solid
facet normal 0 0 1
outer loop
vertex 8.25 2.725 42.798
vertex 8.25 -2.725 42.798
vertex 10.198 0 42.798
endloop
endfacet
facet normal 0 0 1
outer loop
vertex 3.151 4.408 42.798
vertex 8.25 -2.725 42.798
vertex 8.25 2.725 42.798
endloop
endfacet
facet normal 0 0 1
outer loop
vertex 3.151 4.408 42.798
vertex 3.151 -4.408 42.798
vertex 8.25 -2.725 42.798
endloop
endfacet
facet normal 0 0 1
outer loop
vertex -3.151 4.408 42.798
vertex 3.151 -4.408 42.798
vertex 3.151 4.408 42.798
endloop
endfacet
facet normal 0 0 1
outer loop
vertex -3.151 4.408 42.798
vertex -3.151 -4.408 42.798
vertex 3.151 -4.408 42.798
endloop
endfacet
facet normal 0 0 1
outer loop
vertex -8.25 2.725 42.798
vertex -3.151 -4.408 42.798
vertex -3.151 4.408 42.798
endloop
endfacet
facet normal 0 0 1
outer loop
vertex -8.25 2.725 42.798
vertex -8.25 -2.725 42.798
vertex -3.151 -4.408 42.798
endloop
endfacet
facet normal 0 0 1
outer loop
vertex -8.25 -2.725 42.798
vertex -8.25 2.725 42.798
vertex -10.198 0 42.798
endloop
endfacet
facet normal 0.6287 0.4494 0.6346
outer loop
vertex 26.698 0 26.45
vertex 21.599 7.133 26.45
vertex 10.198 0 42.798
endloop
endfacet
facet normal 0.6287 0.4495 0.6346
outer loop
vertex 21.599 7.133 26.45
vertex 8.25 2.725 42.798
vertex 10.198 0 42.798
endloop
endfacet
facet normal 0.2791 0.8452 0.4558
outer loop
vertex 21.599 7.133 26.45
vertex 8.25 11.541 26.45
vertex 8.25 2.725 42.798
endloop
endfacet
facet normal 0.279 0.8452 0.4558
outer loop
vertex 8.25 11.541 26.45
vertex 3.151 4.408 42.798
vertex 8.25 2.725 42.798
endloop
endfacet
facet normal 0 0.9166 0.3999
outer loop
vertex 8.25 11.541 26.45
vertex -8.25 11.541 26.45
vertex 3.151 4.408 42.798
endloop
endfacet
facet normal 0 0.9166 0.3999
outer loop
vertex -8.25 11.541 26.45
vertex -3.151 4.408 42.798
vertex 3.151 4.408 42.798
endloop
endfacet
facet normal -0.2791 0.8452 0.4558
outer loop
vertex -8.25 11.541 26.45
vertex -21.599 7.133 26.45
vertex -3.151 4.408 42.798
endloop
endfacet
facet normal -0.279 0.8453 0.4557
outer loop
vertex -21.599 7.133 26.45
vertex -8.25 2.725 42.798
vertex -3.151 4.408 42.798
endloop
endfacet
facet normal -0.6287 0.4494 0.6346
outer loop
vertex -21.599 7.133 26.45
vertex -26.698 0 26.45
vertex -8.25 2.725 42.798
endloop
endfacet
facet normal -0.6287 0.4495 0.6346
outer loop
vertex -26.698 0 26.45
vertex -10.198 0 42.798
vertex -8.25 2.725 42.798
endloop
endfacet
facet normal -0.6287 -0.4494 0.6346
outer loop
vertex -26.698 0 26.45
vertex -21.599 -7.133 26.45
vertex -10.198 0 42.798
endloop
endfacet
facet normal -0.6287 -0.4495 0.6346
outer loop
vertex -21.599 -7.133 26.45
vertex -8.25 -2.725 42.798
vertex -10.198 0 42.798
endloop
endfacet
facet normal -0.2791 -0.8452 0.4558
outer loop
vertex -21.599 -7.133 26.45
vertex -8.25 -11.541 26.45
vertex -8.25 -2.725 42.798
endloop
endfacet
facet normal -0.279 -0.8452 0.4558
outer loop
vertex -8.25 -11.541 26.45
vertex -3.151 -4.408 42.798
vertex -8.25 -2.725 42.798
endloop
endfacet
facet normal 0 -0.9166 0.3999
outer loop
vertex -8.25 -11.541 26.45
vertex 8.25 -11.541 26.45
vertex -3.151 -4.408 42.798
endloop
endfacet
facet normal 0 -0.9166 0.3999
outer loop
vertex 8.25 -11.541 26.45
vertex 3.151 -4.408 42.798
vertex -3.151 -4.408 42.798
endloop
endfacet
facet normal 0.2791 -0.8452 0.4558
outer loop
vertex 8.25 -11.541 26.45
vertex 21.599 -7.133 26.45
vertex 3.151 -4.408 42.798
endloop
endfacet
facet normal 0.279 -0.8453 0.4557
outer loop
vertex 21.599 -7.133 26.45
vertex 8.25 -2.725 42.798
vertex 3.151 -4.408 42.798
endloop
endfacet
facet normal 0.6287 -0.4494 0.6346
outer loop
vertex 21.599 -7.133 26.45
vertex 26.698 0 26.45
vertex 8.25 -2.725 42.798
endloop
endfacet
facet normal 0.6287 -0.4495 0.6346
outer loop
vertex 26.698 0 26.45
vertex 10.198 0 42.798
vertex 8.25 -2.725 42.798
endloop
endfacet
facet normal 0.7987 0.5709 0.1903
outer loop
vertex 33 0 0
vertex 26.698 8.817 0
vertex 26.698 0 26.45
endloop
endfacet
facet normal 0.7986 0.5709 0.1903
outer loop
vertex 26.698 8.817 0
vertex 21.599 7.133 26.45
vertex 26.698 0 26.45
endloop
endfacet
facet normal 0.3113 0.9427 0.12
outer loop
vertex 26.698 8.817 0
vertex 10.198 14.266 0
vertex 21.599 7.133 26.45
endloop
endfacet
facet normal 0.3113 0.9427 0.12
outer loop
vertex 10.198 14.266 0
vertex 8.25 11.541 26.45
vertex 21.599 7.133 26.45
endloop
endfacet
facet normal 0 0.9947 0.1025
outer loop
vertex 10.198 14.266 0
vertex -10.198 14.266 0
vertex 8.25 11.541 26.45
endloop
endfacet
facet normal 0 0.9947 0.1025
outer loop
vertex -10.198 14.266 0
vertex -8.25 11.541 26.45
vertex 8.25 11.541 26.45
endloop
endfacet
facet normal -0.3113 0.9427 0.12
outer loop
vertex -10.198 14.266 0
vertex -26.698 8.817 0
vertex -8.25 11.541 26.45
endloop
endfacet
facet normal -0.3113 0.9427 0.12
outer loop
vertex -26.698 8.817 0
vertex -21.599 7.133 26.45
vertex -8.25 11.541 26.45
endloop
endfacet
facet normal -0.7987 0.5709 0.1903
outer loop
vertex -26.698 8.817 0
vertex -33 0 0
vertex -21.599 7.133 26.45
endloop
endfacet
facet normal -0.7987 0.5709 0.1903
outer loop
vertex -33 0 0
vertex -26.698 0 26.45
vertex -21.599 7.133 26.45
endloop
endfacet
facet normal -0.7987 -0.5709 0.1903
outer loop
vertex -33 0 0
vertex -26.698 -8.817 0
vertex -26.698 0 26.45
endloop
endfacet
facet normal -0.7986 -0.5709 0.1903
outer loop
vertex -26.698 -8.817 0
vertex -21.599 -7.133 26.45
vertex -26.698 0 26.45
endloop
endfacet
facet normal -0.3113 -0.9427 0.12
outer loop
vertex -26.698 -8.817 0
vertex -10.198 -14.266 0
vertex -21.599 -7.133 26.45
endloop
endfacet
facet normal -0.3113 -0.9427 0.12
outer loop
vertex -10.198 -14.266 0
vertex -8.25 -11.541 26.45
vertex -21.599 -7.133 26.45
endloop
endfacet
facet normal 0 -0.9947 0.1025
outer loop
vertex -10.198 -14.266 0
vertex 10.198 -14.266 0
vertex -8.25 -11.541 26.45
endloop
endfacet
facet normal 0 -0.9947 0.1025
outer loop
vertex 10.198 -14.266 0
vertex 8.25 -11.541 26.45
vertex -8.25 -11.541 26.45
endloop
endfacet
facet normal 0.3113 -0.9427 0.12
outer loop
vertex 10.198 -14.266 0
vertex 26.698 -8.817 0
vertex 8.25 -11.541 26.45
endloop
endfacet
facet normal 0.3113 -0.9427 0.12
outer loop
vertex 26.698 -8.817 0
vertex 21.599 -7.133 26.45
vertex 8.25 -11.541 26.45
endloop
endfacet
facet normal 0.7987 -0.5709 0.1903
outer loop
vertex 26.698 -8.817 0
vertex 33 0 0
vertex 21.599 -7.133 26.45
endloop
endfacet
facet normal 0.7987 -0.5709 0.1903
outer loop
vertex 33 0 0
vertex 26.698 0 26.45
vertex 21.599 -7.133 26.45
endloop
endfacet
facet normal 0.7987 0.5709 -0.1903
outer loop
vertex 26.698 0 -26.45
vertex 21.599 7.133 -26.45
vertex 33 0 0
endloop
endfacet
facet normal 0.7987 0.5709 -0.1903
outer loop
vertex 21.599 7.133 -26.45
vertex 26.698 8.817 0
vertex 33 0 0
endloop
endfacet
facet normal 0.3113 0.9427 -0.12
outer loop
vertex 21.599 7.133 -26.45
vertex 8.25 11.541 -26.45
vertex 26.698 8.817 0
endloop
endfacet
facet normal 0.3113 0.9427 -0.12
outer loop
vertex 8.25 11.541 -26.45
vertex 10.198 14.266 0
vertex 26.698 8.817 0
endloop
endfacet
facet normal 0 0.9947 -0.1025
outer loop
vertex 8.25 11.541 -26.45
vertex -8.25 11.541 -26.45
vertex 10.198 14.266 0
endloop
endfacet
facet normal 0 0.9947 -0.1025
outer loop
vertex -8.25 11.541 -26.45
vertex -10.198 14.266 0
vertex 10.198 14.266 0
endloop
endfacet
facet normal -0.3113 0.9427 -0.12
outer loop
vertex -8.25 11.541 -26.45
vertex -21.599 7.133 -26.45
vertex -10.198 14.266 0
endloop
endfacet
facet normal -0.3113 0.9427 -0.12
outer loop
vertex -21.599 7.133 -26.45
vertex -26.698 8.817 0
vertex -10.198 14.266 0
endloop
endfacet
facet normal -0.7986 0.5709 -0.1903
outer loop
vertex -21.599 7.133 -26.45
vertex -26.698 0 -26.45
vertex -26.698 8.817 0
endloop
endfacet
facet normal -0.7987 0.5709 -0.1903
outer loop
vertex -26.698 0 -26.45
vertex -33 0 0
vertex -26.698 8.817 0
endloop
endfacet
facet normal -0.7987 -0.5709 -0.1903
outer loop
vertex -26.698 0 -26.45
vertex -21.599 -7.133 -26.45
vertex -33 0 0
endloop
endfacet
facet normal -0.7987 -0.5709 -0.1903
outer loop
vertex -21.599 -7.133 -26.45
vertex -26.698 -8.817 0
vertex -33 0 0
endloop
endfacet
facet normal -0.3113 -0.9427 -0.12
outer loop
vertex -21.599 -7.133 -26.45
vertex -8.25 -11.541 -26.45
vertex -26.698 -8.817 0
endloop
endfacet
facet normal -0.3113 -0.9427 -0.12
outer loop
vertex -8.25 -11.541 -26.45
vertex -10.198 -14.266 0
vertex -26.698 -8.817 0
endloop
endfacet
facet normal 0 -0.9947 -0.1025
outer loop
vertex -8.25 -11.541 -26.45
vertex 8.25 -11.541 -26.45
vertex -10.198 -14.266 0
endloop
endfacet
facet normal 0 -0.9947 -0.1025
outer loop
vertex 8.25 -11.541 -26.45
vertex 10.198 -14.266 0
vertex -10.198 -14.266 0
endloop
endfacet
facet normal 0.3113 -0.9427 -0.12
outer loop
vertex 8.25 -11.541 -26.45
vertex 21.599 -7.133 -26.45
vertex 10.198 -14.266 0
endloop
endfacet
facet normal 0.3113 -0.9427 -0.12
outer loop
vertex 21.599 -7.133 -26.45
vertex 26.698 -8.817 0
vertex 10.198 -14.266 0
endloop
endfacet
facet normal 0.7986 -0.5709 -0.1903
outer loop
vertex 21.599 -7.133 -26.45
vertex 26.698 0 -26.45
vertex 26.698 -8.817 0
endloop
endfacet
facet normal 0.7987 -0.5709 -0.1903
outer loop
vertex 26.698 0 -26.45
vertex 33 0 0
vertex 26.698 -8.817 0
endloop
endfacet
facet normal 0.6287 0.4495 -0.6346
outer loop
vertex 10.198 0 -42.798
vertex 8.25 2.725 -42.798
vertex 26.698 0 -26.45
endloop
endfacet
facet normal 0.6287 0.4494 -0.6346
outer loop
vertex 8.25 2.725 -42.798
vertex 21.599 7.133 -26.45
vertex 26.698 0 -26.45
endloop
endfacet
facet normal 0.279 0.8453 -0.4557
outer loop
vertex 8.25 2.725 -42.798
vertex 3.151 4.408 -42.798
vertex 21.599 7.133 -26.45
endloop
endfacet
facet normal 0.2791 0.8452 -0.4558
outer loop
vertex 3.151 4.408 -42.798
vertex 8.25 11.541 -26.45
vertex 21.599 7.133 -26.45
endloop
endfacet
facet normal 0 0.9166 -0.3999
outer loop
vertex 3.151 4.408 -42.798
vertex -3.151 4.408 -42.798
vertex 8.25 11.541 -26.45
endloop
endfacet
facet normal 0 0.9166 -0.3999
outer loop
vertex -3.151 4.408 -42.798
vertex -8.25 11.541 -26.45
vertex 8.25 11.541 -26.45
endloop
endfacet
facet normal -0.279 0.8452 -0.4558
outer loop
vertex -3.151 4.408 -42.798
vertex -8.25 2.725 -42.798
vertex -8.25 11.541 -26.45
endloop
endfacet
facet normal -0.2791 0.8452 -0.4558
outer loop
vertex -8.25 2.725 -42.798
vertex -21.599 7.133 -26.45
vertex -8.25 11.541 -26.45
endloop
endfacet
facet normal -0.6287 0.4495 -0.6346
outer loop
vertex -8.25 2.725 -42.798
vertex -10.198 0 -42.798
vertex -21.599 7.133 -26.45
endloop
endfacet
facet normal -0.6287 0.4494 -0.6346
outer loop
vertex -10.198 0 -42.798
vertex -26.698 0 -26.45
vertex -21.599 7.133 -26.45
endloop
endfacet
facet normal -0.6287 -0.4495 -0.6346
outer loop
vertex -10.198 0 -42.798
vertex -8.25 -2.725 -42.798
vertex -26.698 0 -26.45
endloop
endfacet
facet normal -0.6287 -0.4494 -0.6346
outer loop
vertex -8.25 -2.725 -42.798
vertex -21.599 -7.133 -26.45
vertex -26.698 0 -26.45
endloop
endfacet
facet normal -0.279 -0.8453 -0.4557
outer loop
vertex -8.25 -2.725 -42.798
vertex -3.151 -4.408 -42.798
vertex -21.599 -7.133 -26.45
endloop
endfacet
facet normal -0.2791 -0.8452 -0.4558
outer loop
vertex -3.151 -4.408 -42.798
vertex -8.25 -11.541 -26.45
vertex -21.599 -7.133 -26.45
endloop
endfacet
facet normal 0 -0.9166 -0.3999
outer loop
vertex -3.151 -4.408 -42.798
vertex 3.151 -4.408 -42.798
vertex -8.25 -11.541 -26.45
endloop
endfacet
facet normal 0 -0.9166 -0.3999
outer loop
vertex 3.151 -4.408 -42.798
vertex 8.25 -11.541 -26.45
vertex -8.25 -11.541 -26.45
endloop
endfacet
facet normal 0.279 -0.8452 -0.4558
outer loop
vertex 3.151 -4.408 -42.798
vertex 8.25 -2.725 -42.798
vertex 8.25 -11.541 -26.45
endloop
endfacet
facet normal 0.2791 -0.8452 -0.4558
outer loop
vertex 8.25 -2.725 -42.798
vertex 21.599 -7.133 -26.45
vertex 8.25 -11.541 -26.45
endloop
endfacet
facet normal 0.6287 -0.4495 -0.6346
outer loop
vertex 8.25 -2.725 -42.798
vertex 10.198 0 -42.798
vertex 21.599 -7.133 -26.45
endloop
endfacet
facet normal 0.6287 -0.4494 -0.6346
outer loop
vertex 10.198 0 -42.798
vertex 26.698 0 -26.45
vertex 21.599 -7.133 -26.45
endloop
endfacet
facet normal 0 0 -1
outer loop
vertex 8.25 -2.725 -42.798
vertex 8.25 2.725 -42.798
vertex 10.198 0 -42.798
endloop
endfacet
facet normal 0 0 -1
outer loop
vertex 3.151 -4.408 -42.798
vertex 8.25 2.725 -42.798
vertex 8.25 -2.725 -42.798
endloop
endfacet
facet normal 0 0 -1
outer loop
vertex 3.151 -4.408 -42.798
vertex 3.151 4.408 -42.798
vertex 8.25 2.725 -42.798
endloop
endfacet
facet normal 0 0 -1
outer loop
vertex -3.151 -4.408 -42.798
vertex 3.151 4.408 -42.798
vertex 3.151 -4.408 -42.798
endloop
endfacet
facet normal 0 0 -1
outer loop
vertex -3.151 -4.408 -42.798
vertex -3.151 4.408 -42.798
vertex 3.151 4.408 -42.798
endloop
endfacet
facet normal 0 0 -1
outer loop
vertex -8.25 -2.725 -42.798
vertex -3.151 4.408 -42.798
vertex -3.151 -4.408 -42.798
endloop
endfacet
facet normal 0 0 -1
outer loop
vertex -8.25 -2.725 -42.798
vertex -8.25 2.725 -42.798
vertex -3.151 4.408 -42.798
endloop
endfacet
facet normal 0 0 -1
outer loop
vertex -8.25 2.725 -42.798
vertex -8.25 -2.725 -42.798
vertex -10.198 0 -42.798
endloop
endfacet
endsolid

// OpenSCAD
// Generated by SolidPython 1.0.1 on 2020-07-29 00:46:49


scale(v = [11, 5, 15]) {
	sphere(r = 3);
}
/***********************************************
*********      SolidPython code:      **********
************************************************
 
# import packages: SolidPython
from solid import *
from solid.utils import *
from itertools import chain, combinations, permutations


class Resize:

    def __init__(self, scad_file):
        self.scad_file = scad_file
        #self.scad_file = import_scad(scad_file)
        # cone/cylinder param:
        self.r1 = 0
        self.r2 = 0
        self.h = 0
        # rectangular prism param:
        self.w = 0
        self.l = 0
        # ellipse param:
        self.r = 0

    # import OpenScad code (file name corresponds to shape)


    # classify shape + parameters
    def assign(self, param1, param2, param3):
        if self.scad_file == 'cone.scad':
            self.r1 = param1
            self.r2 = param2
            self.h = param3
        elif self.scad_file == 'cylinder.scad':
            self.r1 = param1
            self.r2 = param2
            self.h = param3
        elif self.scad_file == 'rectangularPrism.scad':
            self.h = param1
            self.l = param2
            self.w = param3
        else:
            self.r = param1
            self.h = param2

    # resize parameters
    def iterate(self):
        x = range(3, 20, 2)
        i = 1
        if self.scad_file == 'cone.scad':
            tempList = list(permutations(x, 2))
            for temp in tempList:
                param1 = temp[0]
                param2 = temp[1]
                filepath = 'produced_scad_files/' + 'cone' + str(param1) + '_' + str(param2) + '_' + '.scad'
                scad_render_to_file(cylinder(h=param1, r1=param2, r2=0), filepath)

        elif self.scad_file == 'cylinder.scad':
            tempList = list(permutations(x, 3))
            for temp in tempList:
                param1 = temp[0]
                param2 = temp[1]
                filepath = 'produced_scad_files/' + 'cylinder' + str(param1) + '_' + str(param2) + '_' + '.scad'
                scad_render_to_file(cylinder(h=param1, r1=param2, r2=param2), filepath)

        elif self.scad_file == 'rectangularPrism.scad':
            tempList = list(permutations(x, 3))
            for temp in tempList:
                param1 = temp[0]
                param2 = temp[1]
                param3 = temp[2]
                filepath = 'produced_scad_files/' + 'rectangularPrism' + str(param1) + '_' + str(param2) + '_' + str(
                    param3) + '.scad'
                scad_render_to_file(cube(size=(param1, param2, param3)), filepath)

        elif self.scad_file == 'ellipse.scad':
            tempList = list(permutations(x, 4))
            for temp in tempList:
                param1 = temp[0]
                param2 = temp[1]
                param3 = temp[2]
                param4 = temp[3]
                filepath = 'produced_scad_files/' + 'ellipse' + str(param1) + '_' + str(param2) + '_' + str(param3) + '_' + str(param4) + '.scad'
                scad_render_to_file(scale([param1, param2, param3])(sphere(r=param4)), filepath)

    def render_to_scadfile(self):
        scad_render_to_file(scad, 'example.scad') 
 
************************************************/
